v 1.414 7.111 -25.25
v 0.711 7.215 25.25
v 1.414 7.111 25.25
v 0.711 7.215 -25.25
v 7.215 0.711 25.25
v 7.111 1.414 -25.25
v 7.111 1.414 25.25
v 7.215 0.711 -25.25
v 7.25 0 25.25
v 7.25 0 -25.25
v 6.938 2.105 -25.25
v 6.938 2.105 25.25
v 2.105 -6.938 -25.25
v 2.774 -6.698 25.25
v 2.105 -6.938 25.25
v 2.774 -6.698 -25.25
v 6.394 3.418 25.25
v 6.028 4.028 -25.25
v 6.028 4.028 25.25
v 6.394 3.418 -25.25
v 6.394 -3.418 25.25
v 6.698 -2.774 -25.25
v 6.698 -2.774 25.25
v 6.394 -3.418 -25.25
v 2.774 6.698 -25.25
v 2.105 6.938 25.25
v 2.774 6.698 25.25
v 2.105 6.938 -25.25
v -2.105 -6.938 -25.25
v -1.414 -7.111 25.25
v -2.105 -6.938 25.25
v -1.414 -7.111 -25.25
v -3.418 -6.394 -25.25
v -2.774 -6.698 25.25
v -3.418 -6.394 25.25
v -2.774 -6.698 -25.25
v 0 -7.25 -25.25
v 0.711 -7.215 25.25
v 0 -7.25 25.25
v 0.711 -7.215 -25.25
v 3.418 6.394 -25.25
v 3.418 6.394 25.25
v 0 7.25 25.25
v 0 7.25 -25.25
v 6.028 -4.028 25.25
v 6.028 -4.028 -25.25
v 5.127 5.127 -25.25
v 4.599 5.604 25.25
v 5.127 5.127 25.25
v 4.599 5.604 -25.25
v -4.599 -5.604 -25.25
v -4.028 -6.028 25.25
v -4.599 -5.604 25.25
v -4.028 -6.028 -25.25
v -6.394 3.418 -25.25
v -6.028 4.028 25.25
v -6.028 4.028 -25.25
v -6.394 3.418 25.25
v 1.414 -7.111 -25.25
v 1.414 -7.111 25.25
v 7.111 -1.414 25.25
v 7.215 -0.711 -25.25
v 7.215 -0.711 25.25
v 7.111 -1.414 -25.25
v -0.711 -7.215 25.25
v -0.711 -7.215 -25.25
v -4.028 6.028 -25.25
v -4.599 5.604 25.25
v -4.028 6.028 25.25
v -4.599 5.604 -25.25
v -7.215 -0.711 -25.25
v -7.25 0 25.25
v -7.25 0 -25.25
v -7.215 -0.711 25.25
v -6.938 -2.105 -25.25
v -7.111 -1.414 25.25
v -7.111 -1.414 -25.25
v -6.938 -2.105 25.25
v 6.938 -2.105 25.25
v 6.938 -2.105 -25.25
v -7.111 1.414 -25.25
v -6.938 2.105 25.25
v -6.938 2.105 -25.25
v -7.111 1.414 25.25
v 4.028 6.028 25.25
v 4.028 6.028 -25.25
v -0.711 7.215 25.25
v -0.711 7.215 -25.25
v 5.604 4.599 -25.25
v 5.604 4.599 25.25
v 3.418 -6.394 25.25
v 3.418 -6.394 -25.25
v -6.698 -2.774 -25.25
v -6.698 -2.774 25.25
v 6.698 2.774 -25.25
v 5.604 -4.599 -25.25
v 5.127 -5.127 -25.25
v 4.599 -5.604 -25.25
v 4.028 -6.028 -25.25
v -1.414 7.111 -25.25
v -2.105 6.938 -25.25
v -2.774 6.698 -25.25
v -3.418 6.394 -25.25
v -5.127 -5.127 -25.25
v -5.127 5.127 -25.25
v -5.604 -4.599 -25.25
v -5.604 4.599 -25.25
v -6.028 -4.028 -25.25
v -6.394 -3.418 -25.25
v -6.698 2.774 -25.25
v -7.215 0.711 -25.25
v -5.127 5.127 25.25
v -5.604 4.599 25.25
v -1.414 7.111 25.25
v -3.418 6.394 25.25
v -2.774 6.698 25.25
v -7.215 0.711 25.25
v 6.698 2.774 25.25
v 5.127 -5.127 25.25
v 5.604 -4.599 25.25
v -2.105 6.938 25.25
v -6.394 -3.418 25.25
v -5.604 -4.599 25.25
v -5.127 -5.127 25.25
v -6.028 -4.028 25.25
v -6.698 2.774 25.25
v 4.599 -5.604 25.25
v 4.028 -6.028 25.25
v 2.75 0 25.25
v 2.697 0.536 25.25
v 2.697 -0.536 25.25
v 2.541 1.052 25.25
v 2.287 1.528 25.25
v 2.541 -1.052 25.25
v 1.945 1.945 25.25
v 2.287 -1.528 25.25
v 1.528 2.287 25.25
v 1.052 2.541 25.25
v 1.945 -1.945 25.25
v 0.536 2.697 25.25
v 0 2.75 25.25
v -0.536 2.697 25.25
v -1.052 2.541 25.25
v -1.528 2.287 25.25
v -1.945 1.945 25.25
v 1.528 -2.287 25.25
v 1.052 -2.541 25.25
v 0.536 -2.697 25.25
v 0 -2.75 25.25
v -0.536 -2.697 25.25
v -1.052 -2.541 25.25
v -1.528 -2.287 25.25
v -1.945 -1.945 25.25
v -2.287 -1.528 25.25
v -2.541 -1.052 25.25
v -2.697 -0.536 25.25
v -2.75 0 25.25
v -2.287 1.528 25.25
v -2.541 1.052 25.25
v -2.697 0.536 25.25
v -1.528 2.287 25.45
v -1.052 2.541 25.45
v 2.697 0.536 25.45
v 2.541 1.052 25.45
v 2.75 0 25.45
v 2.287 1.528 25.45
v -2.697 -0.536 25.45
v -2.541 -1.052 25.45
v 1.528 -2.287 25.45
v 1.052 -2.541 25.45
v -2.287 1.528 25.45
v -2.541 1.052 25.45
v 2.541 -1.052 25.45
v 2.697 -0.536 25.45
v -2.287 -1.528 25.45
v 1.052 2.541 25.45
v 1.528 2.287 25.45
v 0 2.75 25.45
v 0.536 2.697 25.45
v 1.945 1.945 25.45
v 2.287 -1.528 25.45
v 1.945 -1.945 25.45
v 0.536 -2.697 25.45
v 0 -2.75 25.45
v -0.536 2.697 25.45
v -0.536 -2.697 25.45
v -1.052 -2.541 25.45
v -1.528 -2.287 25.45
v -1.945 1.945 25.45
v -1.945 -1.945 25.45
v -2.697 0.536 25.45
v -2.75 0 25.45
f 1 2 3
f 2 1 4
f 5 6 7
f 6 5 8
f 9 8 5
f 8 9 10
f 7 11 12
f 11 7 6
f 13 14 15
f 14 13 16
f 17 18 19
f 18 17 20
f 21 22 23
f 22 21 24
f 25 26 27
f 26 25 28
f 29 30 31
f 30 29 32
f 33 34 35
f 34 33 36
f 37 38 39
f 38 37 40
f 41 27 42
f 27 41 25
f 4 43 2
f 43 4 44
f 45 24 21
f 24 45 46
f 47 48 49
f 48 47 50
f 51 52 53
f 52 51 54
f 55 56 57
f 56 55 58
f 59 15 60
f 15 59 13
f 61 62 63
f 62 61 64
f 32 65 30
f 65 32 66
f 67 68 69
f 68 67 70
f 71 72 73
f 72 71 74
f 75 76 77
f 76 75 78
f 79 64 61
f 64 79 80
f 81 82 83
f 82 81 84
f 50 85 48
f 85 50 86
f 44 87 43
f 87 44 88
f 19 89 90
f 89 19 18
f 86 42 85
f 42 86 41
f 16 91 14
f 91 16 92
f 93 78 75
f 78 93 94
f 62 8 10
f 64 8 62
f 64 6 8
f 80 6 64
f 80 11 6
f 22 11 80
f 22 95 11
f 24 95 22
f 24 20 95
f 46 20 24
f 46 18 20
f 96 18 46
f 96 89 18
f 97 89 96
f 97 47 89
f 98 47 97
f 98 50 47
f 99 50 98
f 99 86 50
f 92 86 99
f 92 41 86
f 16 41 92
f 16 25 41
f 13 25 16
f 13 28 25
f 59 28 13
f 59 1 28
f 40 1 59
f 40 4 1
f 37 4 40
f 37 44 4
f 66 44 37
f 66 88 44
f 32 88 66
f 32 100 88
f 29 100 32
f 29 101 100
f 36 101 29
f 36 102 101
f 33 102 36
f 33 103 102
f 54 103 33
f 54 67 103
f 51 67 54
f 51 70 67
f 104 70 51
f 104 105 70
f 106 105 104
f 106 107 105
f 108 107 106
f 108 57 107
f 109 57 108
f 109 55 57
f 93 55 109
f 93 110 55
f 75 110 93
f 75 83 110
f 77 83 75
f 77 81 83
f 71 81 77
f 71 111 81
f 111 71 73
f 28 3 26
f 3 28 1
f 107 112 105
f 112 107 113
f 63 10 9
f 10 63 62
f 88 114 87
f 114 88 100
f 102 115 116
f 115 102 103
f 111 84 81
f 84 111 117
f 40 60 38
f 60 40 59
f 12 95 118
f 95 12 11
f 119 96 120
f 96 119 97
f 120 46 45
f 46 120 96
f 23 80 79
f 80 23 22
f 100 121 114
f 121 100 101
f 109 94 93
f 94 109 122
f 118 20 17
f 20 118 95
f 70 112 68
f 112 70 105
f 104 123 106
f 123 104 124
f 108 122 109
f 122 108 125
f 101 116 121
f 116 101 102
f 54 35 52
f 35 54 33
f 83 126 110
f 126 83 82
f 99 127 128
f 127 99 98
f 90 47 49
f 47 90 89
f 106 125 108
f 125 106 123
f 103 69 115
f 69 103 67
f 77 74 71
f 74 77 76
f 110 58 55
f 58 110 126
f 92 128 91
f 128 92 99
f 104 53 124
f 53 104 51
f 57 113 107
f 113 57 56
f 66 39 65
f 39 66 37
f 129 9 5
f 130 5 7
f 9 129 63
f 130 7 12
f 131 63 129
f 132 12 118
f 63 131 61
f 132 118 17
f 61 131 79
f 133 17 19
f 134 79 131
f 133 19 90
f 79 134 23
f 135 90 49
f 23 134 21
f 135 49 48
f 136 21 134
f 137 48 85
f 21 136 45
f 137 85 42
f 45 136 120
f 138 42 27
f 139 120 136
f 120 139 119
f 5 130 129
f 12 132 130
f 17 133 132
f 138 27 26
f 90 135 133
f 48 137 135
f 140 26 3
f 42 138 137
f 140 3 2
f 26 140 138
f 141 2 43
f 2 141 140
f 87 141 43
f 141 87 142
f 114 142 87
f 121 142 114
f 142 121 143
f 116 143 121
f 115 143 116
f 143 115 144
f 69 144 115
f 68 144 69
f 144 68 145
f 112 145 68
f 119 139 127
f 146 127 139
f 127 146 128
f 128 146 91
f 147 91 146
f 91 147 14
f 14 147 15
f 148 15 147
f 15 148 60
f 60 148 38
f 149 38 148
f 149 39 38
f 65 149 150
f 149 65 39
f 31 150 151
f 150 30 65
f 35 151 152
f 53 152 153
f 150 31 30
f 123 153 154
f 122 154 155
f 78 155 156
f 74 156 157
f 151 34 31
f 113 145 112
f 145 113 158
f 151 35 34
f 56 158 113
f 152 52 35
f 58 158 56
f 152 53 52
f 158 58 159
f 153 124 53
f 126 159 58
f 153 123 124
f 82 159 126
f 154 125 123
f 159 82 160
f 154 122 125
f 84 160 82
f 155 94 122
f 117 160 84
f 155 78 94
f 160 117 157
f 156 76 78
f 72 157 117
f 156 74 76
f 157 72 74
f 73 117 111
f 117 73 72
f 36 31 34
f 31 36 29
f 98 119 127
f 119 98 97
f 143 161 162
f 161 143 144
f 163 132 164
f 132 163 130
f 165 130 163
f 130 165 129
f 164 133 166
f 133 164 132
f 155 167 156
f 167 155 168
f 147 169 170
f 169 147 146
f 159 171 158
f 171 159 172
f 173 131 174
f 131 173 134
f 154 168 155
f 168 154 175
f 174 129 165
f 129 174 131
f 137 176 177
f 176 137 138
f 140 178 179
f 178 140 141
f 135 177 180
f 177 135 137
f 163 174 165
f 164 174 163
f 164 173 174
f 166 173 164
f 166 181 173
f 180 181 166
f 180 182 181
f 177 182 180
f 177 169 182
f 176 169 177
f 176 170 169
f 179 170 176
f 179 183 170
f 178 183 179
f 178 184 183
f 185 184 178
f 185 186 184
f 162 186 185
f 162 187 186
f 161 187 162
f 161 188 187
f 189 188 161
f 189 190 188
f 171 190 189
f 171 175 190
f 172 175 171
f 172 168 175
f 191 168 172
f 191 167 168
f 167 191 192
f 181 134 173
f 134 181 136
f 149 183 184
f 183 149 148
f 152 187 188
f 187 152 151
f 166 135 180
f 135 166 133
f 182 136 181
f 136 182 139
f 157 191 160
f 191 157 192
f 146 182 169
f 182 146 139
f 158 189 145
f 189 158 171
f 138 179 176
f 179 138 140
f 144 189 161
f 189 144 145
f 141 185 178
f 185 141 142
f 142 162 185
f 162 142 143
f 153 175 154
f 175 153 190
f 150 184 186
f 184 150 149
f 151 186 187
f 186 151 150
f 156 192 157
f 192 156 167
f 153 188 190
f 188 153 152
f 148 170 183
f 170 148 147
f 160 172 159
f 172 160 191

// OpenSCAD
// Parameters
height_mm = 50.5; //[25.25:101:0.1]
diameter_mm = 14.5; //[7.25:29:0.1]
positive_terminal_height_mm = 1; //[0.5:2:0.05]
positive_terminal_diameter_mm = 5.5; //[2.75:11:0.1]
negative_terminal_height_mm = 0.2; //[0.1:0.4:0.01]
negative_terminal_diameter_mm = 6; //[3:12:0.1]
overlap_mm = 0.8; //[0.5:2:0.1]

// Battery - complete geometry
module battery() {
  union() {
    // Cylindrical cell body
    color("DimGray") {
      translate([0, 0, 0])
        cylinder(h=height_mm, r=diameter_mm/2, center=true, $fn=64);
    }
    // Positive terminal button
    color("Silver") {
      translate([0, 0, height_mm/2 + positive_terminal_height_mm/2 - overlap_mm])
        cylinder(h=positive_terminal_height_mm, r=positive_terminal_diameter_mm/2, center=true, $fn=32);
    }
    // Negative terminal contact
    color("Silver") {
      translate([0, 0, -height_mm/2 - negative_terminal_height_mm/2 + overlap_mm])
        cylinder(h=negative_terminal_height_mm, r=negative_terminal_diameter_mm/2, center=true, $fn=32);
    }
  }
}

// Assembly
module assembly() {
  battery();
}

assembly();
